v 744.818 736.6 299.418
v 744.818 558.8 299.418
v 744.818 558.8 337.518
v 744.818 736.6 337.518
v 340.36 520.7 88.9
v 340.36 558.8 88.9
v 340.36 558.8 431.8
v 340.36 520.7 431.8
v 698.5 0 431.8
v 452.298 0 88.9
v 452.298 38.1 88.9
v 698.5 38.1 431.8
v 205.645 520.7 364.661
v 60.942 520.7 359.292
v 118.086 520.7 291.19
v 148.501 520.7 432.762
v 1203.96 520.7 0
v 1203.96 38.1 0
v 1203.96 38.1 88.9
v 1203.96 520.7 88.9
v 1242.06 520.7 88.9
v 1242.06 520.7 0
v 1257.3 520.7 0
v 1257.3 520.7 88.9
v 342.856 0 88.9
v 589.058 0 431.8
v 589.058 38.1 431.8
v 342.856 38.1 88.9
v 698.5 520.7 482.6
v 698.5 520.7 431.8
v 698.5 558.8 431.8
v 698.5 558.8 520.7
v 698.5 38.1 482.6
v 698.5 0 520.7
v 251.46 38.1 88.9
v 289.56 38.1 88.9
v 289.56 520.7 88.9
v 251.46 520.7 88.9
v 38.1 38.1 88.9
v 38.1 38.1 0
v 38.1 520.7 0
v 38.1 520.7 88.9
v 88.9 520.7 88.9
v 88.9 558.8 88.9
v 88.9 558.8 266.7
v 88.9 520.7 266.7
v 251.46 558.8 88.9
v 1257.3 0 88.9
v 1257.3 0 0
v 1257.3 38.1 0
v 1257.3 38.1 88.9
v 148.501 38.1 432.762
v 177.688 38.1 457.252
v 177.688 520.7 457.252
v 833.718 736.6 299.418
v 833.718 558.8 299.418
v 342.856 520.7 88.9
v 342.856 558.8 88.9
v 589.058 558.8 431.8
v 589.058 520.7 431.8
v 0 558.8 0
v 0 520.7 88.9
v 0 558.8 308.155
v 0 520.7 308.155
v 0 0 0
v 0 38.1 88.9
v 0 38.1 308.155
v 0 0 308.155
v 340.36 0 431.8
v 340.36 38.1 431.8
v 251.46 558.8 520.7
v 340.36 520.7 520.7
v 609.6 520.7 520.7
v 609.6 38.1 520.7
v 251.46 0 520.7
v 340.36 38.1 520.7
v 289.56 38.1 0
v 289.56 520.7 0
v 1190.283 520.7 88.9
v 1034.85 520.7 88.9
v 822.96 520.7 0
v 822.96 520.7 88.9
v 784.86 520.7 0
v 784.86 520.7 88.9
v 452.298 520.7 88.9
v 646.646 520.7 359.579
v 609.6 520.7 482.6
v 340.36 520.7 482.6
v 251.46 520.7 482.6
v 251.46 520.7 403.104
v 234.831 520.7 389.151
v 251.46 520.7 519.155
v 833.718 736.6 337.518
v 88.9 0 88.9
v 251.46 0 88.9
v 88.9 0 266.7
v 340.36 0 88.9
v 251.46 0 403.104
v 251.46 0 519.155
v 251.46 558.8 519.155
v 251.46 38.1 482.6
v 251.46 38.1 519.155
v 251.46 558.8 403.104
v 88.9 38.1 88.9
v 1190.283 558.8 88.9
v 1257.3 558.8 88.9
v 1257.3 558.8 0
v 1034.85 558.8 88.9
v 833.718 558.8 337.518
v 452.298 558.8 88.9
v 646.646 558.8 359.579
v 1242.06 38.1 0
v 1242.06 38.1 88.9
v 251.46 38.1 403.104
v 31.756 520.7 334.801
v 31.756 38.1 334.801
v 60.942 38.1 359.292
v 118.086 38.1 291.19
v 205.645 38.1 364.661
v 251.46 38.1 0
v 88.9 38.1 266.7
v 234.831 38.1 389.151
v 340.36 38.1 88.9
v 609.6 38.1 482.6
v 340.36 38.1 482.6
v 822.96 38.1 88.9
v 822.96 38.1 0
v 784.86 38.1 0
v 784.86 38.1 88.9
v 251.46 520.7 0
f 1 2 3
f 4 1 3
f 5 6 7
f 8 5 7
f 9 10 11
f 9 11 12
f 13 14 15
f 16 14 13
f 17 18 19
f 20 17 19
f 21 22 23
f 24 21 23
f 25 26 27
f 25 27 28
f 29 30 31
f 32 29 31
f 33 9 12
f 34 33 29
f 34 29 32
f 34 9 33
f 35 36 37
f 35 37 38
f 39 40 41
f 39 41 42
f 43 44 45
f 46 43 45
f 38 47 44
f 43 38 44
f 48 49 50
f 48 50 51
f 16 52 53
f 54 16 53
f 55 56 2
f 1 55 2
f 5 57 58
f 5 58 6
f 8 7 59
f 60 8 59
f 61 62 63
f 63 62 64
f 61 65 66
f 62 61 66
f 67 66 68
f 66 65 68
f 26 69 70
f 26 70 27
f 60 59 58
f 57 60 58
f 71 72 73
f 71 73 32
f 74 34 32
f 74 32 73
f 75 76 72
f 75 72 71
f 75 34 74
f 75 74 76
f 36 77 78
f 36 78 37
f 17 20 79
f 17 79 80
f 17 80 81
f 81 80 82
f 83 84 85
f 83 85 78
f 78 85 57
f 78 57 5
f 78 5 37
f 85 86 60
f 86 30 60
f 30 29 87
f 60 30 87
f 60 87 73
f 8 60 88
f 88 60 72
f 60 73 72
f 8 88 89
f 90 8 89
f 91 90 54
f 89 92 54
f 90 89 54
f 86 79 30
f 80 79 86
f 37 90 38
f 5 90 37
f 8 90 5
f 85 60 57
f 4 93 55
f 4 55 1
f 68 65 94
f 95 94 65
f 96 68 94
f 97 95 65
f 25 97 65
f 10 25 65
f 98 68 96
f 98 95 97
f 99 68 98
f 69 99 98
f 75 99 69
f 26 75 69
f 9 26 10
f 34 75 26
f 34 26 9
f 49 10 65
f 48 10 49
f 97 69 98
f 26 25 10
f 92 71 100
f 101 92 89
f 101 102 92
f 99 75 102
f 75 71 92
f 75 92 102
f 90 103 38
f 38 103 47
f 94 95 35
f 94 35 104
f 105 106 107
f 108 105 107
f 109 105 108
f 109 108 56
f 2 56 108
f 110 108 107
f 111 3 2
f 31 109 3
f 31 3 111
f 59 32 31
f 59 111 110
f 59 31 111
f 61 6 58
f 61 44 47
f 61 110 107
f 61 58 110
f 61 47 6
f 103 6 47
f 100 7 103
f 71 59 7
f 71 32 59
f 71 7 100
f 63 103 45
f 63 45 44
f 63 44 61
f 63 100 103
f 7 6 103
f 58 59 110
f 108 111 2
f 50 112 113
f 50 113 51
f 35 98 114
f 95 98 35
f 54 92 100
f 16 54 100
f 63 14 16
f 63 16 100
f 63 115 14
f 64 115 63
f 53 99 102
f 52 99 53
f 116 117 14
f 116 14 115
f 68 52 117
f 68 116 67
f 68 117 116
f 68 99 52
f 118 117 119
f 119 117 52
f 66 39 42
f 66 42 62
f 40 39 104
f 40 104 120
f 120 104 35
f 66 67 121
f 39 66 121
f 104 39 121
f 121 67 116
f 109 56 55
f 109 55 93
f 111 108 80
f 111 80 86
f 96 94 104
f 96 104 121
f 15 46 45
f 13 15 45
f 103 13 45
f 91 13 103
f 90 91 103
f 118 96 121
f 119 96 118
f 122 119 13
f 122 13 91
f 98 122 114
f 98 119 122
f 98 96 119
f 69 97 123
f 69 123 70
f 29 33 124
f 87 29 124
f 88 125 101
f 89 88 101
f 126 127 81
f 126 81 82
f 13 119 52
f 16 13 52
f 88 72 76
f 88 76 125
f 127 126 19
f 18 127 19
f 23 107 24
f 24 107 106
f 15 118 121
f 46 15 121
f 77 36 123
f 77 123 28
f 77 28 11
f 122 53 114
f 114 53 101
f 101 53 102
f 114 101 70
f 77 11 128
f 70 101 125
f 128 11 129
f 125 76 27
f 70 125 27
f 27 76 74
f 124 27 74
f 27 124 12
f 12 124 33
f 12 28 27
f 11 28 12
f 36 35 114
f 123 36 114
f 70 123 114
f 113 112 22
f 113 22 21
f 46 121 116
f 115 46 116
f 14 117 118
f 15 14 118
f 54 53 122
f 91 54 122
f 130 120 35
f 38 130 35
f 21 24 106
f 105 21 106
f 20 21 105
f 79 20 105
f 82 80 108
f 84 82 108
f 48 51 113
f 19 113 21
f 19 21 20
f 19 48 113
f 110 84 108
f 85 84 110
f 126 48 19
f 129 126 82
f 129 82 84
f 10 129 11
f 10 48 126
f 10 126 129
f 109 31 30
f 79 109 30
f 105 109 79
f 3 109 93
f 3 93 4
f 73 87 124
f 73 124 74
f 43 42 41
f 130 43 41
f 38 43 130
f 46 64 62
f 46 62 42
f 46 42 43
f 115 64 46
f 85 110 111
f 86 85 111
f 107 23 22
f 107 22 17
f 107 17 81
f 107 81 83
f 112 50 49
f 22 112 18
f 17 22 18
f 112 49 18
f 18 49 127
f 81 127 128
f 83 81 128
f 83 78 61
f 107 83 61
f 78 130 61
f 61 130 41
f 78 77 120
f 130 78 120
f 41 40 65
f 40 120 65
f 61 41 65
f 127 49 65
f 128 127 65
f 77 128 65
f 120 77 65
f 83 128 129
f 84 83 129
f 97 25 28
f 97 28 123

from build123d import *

# Parameters (mm, degrees)
F1_DEPTH = 38.1
F4_W     = 38.1
F4_H     = 88.9
F4_W_2   = 88.9
F4_H_2   = 38.1
F5_DEPTH = 482.6
F7_DEPTH = 38.1
F8_W     = 88.9
F8_H     = 38.1
F9_DEPTH = 177.8


# Not quite as in the source:
# - a feature names something its author has since deleted; it is built from what else it names


with BuildPart() as f1:
    # F0 (on Front) → F1 (new body)
    with BuildSketch(Plane.XZ):
        Polygon((251.46, 403.1040360442), (251.46, 88.9), (340.36, 88.9), (340.36, 431.8), (340.36, 520.7), (251.46, 520.7), (251.46, 519.1547440658), align=None)
        Polygon((0, 308.15475081), (0, 88.9), (88.9, 88.9), (88.9, 266.7), (251.46, 403.1040360442), (251.46, 519.1547440658), align=None)
        Polygon((0, 88.9), (0, 0), (1257.3, 0), (1257.3, 88.9), (452.2981294842, 88.9), (342.8563937201, 88.9), (340.36, 88.9), (251.46, 88.9), (88.9, 88.9), align=None)
        Polygon((673.1, 431.8), (698.5, 431.8), (698.5, 520.7), (340.36, 520.7), (340.36, 431.8), (589.0582642359, 431.8), align=None)
        Polygon((342.8563937201, 88.9), (452.2981294842, 88.9), (698.5, 431.8), (673.1, 431.8), (589.0582642359, 431.8), align=None)
    extrude(amount=-F1_DEPTH)


with BuildPart() as f3_1:
    # F3: instance of F1
    add(f1.part.mirror(Plane(origin=(466.9868832569, 279.4, 206.694910325), x_dir=(1, 0, 0), z_dir=(0, 1, 0))))


with BuildPart() as f1_1:
    add(f1.part)

    add(f3_1.part)  # F5 merges F3_1
    # F4 (on face) → F5 (join, through all)
    with BuildSketch(Plane(origin=(0, 38.1, 0), x_dir=(-1, 0, 0), z_dir=(0, 1, 0))):
        with Locations((-19.05, 44.45)):
            Rectangle(F4_W, F4_H)
        with Locations((-270.51, 44.45)):
            Rectangle(F4_W, F4_H)
        Polygon((-88.9, 266.7), (-31.7561814989, 334.8013509933), (-60.9424747817, 359.2915589223), (-118.0862932828, 291.1902079291), align=None)
        Polygon((-205.6451731313, 364.6608317162), (-148.5013546302, 432.7621827095), (-177.687647913, 457.2523906386), (-234.8314664142, 389.1510396453), align=None)
        with Locations((-803.91, 44.45)):
            Rectangle(F4_W, F4_H)
        Polygon((-251.46, 482.6), (-251.46, 519.1547440658), (-251.46, 520.7), (-340.36, 520.7), (-340.36, 482.6), align=None)
        with Locations((-1223.01, 44.45)):
            Rectangle(F4_W, F4_H)
        with Locations((-654.05, 501.65)):
            Rectangle(F4_W_2, F4_H_2)
    extrude(amount=F5_DEPTH)

    # F6 (on face) → F7 (join)
    with BuildSketch(Plane(origin=(0, 558.8, 0), x_dir=(-1, 0, 0), z_dir=(0, 1, 0))):
        Polygon((-646.6455672201, 359.5792448815), (-698.5, 431.8), (-1190.2829408646, 88.9), (-1034.85039393, 88.9), align=None)
    extrude(amount=-F7_DEPTH)

    # F8 (on face) → F9 (join)
    with BuildSketch(Plane(origin=(0, 558.8, 0), x_dir=(-1, 0, 0), z_dir=(0, 1, 0))):
        with Locations((-789.2684733582, 318.4677249113)):
            Rectangle(F8_W, F8_H)
    extrude(amount=F9_DEPTH)


solid = f1_1.part
